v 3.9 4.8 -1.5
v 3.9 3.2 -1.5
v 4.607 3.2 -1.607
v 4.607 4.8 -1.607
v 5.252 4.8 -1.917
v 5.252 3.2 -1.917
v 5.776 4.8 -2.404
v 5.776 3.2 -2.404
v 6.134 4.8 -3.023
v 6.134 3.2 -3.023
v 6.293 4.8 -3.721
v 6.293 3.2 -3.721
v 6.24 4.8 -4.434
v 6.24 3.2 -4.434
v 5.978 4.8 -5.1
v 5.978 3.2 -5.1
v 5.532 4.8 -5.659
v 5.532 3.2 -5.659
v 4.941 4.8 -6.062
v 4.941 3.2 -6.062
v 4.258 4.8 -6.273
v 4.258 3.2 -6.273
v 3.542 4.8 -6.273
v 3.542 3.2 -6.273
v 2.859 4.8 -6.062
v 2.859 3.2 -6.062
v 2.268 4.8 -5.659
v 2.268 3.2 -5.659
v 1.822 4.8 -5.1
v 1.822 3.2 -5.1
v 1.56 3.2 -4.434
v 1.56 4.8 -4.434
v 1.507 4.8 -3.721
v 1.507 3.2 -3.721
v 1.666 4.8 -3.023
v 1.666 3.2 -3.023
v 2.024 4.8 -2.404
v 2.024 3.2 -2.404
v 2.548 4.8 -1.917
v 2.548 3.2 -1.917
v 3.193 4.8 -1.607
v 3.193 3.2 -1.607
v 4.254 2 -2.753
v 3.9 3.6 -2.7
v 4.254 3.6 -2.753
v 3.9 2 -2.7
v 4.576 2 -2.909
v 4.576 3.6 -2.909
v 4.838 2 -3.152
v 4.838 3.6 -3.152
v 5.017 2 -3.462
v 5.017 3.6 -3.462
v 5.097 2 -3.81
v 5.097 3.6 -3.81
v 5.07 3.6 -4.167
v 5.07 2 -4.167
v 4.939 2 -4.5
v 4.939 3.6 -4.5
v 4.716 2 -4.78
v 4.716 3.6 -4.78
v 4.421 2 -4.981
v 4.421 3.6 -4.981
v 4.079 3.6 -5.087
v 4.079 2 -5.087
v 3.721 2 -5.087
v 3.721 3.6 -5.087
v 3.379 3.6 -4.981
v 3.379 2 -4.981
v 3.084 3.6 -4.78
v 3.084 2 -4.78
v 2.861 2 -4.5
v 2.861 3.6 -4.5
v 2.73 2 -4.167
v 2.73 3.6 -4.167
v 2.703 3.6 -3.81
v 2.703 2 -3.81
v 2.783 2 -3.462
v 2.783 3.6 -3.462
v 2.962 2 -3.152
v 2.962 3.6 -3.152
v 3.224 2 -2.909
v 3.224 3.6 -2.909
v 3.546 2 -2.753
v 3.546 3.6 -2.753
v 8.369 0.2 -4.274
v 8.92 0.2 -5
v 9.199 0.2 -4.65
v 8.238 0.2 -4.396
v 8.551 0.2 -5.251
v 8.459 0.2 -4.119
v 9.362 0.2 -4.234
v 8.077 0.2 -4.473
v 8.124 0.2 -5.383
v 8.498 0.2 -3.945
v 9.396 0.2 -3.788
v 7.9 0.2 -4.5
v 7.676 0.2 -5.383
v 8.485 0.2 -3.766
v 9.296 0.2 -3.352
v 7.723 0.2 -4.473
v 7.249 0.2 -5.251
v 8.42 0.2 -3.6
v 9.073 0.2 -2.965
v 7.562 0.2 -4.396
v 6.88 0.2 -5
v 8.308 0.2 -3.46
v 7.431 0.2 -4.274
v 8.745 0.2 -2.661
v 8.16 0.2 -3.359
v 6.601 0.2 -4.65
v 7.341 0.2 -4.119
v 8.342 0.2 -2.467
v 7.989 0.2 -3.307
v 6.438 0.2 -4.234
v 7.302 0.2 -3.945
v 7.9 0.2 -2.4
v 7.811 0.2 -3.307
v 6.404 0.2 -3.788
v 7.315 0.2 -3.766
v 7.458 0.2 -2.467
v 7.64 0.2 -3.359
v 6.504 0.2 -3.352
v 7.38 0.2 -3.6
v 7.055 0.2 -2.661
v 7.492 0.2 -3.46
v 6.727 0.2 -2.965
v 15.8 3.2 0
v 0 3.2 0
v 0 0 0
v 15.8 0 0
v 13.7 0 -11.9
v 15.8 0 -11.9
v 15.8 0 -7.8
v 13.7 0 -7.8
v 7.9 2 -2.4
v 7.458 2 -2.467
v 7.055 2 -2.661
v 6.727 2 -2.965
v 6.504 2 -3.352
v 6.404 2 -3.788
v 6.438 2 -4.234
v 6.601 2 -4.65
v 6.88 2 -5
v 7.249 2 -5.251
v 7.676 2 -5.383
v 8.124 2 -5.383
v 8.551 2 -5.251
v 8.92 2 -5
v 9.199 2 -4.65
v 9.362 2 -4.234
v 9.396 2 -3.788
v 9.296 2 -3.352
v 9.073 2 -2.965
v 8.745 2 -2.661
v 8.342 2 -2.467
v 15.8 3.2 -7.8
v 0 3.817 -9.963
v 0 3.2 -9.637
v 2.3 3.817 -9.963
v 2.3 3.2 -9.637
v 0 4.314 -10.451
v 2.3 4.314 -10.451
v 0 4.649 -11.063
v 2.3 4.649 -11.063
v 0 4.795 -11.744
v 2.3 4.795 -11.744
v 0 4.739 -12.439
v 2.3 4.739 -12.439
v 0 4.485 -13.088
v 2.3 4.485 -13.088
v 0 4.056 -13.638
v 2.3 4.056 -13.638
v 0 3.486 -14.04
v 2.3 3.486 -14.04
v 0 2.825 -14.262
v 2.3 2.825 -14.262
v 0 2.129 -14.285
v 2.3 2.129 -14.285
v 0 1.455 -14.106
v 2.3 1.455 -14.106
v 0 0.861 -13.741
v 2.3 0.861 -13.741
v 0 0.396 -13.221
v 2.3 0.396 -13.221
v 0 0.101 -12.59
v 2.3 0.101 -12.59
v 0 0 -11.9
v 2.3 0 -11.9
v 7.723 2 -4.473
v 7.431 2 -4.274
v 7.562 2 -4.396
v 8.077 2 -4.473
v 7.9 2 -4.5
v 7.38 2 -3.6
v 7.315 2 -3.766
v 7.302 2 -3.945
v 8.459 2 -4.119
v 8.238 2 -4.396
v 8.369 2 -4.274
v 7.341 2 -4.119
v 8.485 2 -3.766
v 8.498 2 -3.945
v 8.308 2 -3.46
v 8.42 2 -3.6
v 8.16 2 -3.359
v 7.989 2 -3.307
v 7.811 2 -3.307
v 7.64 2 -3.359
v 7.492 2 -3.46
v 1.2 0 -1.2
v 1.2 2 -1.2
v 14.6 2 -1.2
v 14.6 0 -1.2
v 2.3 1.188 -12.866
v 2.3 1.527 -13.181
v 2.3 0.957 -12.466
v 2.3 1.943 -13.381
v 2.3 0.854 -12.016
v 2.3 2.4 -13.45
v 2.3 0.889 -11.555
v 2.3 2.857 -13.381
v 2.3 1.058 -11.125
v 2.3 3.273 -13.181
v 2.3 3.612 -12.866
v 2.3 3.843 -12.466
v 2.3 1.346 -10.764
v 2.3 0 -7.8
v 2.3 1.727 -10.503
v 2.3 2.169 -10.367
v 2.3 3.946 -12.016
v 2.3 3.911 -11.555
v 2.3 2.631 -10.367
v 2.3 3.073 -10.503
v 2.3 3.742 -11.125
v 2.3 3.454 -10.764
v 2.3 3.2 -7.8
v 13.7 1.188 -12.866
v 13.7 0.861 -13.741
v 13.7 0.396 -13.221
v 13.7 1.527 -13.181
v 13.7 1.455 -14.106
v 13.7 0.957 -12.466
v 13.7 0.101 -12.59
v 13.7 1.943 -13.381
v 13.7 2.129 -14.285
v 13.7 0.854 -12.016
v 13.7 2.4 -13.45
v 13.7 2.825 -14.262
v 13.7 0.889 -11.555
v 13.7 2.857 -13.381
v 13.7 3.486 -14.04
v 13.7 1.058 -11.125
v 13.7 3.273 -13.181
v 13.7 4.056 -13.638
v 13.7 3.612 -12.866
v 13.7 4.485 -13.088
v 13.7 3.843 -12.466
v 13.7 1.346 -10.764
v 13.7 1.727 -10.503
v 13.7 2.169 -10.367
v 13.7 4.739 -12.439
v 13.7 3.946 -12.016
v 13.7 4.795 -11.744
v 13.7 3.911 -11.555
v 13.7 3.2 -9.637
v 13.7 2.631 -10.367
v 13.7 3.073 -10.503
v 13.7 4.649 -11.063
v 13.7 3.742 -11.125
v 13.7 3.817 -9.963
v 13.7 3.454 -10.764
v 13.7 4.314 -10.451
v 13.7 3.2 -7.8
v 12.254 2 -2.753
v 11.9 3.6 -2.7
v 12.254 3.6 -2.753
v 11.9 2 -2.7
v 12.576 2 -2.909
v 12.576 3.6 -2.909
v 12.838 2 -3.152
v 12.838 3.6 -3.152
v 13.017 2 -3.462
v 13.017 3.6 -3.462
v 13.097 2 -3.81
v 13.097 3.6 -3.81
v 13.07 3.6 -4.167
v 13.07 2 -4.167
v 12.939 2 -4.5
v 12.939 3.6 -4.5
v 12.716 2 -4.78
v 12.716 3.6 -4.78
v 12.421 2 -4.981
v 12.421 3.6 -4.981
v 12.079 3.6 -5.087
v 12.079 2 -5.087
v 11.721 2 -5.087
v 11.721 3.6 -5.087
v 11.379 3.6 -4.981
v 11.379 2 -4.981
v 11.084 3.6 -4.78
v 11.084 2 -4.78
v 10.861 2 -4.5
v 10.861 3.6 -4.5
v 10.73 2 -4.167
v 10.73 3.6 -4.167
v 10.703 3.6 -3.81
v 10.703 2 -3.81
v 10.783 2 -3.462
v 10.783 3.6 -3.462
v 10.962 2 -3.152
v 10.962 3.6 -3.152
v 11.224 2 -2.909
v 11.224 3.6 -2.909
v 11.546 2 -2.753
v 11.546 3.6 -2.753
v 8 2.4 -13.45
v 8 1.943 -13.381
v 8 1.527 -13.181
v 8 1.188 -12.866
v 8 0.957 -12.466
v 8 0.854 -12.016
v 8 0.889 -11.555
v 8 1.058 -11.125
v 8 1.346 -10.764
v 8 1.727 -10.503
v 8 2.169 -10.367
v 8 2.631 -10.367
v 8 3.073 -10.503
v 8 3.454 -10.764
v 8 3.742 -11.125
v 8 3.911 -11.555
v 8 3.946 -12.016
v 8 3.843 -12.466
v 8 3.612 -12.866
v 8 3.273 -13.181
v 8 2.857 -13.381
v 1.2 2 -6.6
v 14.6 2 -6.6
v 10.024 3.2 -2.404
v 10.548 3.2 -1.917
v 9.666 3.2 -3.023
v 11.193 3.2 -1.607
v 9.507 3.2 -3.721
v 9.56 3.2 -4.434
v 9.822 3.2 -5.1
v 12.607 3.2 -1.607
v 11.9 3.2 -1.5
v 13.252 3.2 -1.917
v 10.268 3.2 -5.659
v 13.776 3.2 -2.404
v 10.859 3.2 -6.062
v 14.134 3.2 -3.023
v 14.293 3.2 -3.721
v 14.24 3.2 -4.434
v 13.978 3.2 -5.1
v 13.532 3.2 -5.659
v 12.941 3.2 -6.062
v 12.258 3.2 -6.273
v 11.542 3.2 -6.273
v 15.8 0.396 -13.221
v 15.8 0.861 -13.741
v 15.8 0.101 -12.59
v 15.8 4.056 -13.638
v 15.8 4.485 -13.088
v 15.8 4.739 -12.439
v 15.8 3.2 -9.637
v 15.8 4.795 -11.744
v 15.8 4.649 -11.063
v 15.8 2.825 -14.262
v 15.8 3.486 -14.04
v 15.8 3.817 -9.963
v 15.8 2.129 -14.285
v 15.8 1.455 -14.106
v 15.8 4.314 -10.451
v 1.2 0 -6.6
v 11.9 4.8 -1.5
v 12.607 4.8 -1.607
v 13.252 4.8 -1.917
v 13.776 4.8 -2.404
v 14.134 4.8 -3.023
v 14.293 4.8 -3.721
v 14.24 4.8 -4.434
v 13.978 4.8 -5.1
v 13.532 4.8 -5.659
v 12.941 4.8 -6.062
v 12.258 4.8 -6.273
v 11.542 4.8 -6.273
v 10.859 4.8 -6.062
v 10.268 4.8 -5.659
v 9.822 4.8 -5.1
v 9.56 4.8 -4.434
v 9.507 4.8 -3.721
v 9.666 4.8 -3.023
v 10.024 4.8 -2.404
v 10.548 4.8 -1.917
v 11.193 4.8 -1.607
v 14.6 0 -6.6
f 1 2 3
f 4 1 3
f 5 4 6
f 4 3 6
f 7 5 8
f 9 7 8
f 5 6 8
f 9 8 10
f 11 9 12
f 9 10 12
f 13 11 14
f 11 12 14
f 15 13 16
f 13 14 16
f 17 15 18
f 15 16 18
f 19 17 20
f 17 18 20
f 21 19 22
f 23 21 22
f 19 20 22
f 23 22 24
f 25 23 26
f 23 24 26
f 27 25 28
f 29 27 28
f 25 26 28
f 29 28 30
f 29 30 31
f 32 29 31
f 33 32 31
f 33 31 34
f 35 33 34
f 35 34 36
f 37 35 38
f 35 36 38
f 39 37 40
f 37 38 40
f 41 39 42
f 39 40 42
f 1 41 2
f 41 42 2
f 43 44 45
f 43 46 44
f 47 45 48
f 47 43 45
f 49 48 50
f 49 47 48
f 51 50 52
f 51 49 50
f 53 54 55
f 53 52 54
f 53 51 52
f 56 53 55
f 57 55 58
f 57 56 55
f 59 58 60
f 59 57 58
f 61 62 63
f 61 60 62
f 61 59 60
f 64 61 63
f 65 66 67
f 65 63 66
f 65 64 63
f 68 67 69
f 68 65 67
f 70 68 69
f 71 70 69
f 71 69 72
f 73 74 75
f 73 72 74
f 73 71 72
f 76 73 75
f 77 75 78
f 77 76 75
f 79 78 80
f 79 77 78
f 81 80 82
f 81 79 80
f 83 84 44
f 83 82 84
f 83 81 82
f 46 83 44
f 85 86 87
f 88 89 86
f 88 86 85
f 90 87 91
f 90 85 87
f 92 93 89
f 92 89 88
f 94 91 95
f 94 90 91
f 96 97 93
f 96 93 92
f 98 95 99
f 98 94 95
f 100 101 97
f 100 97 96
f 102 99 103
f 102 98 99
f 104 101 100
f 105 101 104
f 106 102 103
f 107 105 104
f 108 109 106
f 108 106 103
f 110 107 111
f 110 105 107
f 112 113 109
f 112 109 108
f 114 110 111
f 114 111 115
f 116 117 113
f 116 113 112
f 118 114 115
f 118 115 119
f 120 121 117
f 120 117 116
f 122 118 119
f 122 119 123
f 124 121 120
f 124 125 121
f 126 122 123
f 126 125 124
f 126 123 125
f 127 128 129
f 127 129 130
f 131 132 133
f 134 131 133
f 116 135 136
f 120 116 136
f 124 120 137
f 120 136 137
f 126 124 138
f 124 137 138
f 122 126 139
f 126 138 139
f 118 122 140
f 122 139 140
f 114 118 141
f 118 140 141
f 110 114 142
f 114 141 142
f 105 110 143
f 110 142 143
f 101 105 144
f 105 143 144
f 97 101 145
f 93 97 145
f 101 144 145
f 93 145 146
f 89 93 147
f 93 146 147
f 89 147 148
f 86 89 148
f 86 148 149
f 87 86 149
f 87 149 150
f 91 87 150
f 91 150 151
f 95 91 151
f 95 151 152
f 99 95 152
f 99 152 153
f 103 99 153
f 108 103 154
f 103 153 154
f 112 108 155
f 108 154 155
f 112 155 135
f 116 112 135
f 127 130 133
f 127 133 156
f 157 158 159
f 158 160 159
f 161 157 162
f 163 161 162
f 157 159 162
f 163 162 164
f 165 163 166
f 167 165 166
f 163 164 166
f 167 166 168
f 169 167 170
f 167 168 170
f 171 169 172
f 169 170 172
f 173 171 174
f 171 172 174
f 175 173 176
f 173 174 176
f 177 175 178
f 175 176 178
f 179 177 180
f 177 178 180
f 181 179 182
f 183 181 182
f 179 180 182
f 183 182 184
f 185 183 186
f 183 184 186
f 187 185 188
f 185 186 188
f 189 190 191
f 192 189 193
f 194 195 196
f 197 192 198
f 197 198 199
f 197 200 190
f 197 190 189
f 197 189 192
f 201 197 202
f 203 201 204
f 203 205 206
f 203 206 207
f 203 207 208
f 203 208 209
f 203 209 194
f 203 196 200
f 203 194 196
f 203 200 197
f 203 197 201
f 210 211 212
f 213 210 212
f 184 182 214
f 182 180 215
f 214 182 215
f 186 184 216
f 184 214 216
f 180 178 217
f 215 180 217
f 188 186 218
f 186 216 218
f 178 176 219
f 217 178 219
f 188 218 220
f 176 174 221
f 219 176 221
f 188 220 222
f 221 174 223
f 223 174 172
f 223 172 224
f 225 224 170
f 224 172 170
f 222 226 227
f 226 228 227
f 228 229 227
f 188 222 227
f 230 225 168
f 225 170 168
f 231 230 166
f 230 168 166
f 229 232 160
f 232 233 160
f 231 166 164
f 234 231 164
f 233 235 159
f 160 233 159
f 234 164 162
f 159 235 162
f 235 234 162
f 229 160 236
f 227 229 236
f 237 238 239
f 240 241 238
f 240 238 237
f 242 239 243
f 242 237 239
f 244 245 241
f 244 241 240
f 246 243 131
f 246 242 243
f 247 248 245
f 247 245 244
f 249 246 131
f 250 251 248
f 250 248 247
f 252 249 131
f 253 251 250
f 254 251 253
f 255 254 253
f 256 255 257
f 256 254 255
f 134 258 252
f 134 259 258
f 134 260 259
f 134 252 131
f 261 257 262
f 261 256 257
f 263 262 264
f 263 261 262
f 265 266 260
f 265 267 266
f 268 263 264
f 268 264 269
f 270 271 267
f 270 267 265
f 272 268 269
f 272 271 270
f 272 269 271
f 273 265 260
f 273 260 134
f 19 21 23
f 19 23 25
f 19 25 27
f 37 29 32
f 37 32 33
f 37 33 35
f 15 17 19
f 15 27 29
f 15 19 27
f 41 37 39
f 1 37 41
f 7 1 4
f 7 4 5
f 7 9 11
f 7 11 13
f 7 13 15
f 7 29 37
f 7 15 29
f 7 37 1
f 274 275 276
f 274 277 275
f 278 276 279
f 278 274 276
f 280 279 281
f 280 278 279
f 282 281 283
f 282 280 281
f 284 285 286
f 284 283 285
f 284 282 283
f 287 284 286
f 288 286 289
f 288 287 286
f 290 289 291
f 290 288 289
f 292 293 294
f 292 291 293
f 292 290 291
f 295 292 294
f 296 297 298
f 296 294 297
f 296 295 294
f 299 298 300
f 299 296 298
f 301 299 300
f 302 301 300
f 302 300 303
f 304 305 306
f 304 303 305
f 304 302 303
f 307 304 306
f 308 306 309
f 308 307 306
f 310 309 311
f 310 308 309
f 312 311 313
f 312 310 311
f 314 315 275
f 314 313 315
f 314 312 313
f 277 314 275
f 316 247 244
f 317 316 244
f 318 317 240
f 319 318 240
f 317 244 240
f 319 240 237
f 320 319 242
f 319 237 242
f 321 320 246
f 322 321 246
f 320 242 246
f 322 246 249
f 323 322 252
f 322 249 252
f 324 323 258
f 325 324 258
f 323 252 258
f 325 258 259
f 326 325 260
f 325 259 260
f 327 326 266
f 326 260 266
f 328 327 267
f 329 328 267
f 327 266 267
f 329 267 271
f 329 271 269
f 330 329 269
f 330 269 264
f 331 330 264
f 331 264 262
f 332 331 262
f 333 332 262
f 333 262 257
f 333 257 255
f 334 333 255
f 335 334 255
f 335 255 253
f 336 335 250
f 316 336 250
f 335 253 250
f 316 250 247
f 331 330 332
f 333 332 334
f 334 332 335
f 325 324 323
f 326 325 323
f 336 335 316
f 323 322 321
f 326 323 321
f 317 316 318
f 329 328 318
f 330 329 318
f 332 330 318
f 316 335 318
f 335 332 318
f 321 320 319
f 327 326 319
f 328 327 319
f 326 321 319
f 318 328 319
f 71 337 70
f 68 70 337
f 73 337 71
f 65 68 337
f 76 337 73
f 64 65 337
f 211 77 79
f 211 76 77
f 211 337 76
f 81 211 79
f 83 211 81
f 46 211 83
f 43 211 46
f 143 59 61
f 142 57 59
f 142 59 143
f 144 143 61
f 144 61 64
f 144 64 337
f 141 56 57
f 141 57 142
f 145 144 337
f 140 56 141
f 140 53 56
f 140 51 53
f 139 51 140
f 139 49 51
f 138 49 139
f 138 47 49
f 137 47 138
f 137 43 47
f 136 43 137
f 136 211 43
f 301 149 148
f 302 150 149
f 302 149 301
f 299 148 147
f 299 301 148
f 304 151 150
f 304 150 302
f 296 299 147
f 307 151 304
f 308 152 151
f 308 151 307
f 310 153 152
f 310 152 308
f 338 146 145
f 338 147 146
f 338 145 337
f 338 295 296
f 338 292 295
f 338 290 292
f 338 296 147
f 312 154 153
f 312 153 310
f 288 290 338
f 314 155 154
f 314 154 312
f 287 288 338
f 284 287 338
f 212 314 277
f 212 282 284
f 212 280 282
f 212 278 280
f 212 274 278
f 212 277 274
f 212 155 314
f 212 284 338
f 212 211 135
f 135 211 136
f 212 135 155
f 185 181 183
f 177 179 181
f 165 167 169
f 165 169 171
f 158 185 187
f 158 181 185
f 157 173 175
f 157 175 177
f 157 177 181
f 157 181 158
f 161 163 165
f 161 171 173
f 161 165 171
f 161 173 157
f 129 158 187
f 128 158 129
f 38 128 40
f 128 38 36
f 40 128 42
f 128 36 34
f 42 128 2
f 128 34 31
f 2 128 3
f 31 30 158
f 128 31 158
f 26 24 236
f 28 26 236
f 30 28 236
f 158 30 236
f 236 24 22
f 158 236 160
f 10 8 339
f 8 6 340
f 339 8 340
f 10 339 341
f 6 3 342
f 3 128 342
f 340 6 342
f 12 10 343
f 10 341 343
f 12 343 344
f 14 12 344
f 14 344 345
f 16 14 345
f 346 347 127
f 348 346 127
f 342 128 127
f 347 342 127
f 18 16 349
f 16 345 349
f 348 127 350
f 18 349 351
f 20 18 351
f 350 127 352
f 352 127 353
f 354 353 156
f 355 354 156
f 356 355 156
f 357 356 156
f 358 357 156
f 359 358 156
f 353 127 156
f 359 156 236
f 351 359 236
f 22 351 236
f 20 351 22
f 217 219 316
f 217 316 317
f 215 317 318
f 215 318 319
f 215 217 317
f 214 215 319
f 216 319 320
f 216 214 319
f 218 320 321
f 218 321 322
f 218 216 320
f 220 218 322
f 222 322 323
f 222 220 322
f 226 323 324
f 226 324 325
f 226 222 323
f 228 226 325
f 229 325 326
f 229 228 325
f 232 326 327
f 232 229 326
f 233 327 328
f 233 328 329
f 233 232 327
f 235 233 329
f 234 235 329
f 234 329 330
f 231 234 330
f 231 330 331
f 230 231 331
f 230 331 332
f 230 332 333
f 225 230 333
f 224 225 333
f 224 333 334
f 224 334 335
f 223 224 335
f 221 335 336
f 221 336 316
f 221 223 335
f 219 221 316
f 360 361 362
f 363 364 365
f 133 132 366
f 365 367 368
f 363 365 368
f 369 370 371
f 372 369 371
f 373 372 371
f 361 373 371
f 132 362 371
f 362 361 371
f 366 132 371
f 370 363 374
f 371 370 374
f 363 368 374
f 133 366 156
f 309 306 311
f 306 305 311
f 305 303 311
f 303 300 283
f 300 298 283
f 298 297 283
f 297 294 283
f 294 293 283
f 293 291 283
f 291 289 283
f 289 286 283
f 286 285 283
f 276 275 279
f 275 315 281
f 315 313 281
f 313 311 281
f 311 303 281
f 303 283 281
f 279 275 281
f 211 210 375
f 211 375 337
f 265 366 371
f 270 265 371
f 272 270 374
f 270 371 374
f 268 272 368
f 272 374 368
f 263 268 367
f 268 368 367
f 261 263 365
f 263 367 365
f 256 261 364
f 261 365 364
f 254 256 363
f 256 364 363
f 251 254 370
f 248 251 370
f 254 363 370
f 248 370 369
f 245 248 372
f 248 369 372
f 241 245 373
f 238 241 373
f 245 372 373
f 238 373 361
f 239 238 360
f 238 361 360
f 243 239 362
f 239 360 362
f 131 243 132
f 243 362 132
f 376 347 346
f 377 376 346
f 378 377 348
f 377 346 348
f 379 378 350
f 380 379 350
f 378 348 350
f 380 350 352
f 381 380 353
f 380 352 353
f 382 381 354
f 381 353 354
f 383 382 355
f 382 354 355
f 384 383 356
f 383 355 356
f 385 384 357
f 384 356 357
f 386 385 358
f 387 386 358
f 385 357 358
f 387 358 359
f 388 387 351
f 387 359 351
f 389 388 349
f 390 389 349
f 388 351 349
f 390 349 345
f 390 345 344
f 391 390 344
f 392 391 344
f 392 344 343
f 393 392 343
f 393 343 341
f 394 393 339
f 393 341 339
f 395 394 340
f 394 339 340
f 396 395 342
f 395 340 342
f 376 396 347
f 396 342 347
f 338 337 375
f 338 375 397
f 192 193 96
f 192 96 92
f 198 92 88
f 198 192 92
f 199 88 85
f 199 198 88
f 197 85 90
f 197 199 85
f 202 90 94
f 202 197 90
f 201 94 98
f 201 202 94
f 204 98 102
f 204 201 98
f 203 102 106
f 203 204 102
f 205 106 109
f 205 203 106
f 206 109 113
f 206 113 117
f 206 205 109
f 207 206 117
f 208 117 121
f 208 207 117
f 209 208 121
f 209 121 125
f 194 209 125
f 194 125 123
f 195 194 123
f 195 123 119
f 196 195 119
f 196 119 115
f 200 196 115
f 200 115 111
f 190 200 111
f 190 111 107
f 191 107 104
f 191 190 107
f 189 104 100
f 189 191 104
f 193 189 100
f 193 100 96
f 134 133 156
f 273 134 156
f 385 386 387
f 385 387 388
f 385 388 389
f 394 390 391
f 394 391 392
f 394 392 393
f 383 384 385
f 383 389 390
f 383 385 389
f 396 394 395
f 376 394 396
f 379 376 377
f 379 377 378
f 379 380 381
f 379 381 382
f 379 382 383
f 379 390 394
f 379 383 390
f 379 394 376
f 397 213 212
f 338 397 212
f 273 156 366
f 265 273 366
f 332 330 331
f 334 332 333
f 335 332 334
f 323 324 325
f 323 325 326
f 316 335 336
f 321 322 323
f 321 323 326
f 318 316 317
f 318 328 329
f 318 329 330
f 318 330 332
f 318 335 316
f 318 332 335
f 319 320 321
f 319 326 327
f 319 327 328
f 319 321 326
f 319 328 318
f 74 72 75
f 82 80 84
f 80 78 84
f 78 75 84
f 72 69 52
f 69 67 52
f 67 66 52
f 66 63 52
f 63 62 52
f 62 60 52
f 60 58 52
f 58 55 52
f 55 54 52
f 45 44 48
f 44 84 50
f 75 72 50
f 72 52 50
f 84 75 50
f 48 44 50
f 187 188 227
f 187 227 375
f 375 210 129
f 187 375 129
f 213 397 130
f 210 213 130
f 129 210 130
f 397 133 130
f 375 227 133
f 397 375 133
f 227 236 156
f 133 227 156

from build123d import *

# Parameters (mm, degrees)
SKETCH1_W            = 15.8
SKETCH1_H            = 3.2
BOSS_EXTRUDE1_DEPTH  = 7.8
SKETCH2_R            = 2.4
BOSS_EXTRUDE2_DEPTH  = 1.6
LPATTERN1_COUNT      = 2
LPATTERN1_PITCH      = 8
LPATTERN1_COUNT_DIR2 = 4
LPATTERN1_PITCH_DIR2 = 8
SHELL1_T             = -1.2
SKETCH3_R            = 1.5
SKETCH3_R_2          = 0.6
BOSS_EXTRUDE3_DEPTH  = 1.8
BOSS_EXTRUDE4_DEPTH  = 2.1
SKETCH5_R            = 1.55
BOSS_EXTRUDE5_DEPTH  = 5.7
BOSS_EXTRUDE6_DEPTH  = 0.2


with BuildPart() as part:
    # Sketch1 → Boss-Extrude1 (new body)
    with BuildSketch(Plane.XY):
        with Locations((7.9, 1.6)):
            Rectangle(SKETCH1_W, SKETCH1_H)
    extrude(amount=-BOSS_EXTRUDE1_DEPTH)

    # Sketch2 → Boss-Extrude2 (add)
    with BuildSketch(Plane(origin=(0, 3.2, 0), x_dir=(1, 0, 0), z_dir=(0, 1, 0))):
        with Locations(Location((3.9, 3.9, 0), (0, 0, 270))):
            Circle(SKETCH2_R)
    boss_extrude2 = extrude(amount=BOSS_EXTRUDE2_DEPTH)

    # LPattern1: Boss-Extrude2 2 × 4, 6 skipped
    with Locations(*[(j * LPATTERN1_PITCH_DIR2, 0, i * LPATTERN1_PITCH) for i in range(LPATTERN1_COUNT) for j in range(LPATTERN1_COUNT_DIR2) if (i, j) not in ((0, 0), (0, 2), (0, 3), (1, 0), (1, 1), (1, 2), (1, 3))]):
        add(boss_extrude2)

    # Shell1
    shell1_openings = [part.faces().sort_by_distance(p)[0] for p in [
        (7.9, 0, -3.9),
    ]]
    offset(amount=SHELL1_T, openings=shell1_openings, kind=Kind.INTERSECTION)

    # Sketch3 → Boss-Extrude3 (add)
    with BuildSketch(Plane.XZ.offset(-2)):
        with Locations(Location((7.9, -3.9, 0), (0, 0, 90))):
            Circle(SKETCH3_R)
        with Locations(Location((7.9, -3.9, 0), (0, 0, 270))):
            Circle(SKETCH3_R_2, mode=Mode.SUBTRACT)
    extrude(amount=BOSS_EXTRUDE3_DEPTH)



with BuildPart() as body_2:
    # Sketch4 → Boss-Extrude4 (new body)
    with BuildSketch(Plane(origin=(15.8, 0, 0), x_dir=(0, 0, -1), z_dir=(1, 0, 0))):
        with BuildLine():
            Line((7.8, 3.2), (9.6372583, 3.2))
            ThreePointArc((9.6372583, 3.2), (13.859591794, 3.785640646), (11.9, 0))
            Line((11.9, 0), (7.8, 0))
            Line((7.8, 0), (7.8, 3.2))
        make_face()
    extrude(amount=-BOSS_EXTRUDE4_DEPTH)

    # Sketch5 → Boss-Extrude5 (add)
    with BuildSketch(Plane.ZY.offset(-13.7)):
        with Locations(Location((-11.9, 2.4, 0), (0, 0, 180))):
            Circle(SKETCH5_R)
    extrude(amount=BOSS_EXTRUDE5_DEPTH)


with BuildPart() as body_3:
    # Mirror2: mirrored copy
    add(body_2.part.mirror(Plane(origin=(8, 0, 0), x_dir=(0, 0, 1), z_dir=(1, 0, 0))))


with BuildPart() as part_1:
    add(part.part)

    add(body_3.part)  # Boss-Extrude6 merges body 3
    # Sketch6 → Boss-Extrude6 (add)
    with BuildSketch(Plane.ZY.offset(-0.2)):
        with BuildLine():
            Line((-7.8, 0), (-7.8, 3.2))
            Line((-7.8, 3.2), (-9.6372583, 3.2))
            ThreePointArc((-9.6372583, 3.2), (-13.859591794, 3.785640646), (-11.9, 0))
            Line((-11.9, 0), (-7.8, 0))
        make_face()
    extrude(amount=BOSS_EXTRUDE6_DEPTH)


solid = Compound([body_2.part, part_1.part])
